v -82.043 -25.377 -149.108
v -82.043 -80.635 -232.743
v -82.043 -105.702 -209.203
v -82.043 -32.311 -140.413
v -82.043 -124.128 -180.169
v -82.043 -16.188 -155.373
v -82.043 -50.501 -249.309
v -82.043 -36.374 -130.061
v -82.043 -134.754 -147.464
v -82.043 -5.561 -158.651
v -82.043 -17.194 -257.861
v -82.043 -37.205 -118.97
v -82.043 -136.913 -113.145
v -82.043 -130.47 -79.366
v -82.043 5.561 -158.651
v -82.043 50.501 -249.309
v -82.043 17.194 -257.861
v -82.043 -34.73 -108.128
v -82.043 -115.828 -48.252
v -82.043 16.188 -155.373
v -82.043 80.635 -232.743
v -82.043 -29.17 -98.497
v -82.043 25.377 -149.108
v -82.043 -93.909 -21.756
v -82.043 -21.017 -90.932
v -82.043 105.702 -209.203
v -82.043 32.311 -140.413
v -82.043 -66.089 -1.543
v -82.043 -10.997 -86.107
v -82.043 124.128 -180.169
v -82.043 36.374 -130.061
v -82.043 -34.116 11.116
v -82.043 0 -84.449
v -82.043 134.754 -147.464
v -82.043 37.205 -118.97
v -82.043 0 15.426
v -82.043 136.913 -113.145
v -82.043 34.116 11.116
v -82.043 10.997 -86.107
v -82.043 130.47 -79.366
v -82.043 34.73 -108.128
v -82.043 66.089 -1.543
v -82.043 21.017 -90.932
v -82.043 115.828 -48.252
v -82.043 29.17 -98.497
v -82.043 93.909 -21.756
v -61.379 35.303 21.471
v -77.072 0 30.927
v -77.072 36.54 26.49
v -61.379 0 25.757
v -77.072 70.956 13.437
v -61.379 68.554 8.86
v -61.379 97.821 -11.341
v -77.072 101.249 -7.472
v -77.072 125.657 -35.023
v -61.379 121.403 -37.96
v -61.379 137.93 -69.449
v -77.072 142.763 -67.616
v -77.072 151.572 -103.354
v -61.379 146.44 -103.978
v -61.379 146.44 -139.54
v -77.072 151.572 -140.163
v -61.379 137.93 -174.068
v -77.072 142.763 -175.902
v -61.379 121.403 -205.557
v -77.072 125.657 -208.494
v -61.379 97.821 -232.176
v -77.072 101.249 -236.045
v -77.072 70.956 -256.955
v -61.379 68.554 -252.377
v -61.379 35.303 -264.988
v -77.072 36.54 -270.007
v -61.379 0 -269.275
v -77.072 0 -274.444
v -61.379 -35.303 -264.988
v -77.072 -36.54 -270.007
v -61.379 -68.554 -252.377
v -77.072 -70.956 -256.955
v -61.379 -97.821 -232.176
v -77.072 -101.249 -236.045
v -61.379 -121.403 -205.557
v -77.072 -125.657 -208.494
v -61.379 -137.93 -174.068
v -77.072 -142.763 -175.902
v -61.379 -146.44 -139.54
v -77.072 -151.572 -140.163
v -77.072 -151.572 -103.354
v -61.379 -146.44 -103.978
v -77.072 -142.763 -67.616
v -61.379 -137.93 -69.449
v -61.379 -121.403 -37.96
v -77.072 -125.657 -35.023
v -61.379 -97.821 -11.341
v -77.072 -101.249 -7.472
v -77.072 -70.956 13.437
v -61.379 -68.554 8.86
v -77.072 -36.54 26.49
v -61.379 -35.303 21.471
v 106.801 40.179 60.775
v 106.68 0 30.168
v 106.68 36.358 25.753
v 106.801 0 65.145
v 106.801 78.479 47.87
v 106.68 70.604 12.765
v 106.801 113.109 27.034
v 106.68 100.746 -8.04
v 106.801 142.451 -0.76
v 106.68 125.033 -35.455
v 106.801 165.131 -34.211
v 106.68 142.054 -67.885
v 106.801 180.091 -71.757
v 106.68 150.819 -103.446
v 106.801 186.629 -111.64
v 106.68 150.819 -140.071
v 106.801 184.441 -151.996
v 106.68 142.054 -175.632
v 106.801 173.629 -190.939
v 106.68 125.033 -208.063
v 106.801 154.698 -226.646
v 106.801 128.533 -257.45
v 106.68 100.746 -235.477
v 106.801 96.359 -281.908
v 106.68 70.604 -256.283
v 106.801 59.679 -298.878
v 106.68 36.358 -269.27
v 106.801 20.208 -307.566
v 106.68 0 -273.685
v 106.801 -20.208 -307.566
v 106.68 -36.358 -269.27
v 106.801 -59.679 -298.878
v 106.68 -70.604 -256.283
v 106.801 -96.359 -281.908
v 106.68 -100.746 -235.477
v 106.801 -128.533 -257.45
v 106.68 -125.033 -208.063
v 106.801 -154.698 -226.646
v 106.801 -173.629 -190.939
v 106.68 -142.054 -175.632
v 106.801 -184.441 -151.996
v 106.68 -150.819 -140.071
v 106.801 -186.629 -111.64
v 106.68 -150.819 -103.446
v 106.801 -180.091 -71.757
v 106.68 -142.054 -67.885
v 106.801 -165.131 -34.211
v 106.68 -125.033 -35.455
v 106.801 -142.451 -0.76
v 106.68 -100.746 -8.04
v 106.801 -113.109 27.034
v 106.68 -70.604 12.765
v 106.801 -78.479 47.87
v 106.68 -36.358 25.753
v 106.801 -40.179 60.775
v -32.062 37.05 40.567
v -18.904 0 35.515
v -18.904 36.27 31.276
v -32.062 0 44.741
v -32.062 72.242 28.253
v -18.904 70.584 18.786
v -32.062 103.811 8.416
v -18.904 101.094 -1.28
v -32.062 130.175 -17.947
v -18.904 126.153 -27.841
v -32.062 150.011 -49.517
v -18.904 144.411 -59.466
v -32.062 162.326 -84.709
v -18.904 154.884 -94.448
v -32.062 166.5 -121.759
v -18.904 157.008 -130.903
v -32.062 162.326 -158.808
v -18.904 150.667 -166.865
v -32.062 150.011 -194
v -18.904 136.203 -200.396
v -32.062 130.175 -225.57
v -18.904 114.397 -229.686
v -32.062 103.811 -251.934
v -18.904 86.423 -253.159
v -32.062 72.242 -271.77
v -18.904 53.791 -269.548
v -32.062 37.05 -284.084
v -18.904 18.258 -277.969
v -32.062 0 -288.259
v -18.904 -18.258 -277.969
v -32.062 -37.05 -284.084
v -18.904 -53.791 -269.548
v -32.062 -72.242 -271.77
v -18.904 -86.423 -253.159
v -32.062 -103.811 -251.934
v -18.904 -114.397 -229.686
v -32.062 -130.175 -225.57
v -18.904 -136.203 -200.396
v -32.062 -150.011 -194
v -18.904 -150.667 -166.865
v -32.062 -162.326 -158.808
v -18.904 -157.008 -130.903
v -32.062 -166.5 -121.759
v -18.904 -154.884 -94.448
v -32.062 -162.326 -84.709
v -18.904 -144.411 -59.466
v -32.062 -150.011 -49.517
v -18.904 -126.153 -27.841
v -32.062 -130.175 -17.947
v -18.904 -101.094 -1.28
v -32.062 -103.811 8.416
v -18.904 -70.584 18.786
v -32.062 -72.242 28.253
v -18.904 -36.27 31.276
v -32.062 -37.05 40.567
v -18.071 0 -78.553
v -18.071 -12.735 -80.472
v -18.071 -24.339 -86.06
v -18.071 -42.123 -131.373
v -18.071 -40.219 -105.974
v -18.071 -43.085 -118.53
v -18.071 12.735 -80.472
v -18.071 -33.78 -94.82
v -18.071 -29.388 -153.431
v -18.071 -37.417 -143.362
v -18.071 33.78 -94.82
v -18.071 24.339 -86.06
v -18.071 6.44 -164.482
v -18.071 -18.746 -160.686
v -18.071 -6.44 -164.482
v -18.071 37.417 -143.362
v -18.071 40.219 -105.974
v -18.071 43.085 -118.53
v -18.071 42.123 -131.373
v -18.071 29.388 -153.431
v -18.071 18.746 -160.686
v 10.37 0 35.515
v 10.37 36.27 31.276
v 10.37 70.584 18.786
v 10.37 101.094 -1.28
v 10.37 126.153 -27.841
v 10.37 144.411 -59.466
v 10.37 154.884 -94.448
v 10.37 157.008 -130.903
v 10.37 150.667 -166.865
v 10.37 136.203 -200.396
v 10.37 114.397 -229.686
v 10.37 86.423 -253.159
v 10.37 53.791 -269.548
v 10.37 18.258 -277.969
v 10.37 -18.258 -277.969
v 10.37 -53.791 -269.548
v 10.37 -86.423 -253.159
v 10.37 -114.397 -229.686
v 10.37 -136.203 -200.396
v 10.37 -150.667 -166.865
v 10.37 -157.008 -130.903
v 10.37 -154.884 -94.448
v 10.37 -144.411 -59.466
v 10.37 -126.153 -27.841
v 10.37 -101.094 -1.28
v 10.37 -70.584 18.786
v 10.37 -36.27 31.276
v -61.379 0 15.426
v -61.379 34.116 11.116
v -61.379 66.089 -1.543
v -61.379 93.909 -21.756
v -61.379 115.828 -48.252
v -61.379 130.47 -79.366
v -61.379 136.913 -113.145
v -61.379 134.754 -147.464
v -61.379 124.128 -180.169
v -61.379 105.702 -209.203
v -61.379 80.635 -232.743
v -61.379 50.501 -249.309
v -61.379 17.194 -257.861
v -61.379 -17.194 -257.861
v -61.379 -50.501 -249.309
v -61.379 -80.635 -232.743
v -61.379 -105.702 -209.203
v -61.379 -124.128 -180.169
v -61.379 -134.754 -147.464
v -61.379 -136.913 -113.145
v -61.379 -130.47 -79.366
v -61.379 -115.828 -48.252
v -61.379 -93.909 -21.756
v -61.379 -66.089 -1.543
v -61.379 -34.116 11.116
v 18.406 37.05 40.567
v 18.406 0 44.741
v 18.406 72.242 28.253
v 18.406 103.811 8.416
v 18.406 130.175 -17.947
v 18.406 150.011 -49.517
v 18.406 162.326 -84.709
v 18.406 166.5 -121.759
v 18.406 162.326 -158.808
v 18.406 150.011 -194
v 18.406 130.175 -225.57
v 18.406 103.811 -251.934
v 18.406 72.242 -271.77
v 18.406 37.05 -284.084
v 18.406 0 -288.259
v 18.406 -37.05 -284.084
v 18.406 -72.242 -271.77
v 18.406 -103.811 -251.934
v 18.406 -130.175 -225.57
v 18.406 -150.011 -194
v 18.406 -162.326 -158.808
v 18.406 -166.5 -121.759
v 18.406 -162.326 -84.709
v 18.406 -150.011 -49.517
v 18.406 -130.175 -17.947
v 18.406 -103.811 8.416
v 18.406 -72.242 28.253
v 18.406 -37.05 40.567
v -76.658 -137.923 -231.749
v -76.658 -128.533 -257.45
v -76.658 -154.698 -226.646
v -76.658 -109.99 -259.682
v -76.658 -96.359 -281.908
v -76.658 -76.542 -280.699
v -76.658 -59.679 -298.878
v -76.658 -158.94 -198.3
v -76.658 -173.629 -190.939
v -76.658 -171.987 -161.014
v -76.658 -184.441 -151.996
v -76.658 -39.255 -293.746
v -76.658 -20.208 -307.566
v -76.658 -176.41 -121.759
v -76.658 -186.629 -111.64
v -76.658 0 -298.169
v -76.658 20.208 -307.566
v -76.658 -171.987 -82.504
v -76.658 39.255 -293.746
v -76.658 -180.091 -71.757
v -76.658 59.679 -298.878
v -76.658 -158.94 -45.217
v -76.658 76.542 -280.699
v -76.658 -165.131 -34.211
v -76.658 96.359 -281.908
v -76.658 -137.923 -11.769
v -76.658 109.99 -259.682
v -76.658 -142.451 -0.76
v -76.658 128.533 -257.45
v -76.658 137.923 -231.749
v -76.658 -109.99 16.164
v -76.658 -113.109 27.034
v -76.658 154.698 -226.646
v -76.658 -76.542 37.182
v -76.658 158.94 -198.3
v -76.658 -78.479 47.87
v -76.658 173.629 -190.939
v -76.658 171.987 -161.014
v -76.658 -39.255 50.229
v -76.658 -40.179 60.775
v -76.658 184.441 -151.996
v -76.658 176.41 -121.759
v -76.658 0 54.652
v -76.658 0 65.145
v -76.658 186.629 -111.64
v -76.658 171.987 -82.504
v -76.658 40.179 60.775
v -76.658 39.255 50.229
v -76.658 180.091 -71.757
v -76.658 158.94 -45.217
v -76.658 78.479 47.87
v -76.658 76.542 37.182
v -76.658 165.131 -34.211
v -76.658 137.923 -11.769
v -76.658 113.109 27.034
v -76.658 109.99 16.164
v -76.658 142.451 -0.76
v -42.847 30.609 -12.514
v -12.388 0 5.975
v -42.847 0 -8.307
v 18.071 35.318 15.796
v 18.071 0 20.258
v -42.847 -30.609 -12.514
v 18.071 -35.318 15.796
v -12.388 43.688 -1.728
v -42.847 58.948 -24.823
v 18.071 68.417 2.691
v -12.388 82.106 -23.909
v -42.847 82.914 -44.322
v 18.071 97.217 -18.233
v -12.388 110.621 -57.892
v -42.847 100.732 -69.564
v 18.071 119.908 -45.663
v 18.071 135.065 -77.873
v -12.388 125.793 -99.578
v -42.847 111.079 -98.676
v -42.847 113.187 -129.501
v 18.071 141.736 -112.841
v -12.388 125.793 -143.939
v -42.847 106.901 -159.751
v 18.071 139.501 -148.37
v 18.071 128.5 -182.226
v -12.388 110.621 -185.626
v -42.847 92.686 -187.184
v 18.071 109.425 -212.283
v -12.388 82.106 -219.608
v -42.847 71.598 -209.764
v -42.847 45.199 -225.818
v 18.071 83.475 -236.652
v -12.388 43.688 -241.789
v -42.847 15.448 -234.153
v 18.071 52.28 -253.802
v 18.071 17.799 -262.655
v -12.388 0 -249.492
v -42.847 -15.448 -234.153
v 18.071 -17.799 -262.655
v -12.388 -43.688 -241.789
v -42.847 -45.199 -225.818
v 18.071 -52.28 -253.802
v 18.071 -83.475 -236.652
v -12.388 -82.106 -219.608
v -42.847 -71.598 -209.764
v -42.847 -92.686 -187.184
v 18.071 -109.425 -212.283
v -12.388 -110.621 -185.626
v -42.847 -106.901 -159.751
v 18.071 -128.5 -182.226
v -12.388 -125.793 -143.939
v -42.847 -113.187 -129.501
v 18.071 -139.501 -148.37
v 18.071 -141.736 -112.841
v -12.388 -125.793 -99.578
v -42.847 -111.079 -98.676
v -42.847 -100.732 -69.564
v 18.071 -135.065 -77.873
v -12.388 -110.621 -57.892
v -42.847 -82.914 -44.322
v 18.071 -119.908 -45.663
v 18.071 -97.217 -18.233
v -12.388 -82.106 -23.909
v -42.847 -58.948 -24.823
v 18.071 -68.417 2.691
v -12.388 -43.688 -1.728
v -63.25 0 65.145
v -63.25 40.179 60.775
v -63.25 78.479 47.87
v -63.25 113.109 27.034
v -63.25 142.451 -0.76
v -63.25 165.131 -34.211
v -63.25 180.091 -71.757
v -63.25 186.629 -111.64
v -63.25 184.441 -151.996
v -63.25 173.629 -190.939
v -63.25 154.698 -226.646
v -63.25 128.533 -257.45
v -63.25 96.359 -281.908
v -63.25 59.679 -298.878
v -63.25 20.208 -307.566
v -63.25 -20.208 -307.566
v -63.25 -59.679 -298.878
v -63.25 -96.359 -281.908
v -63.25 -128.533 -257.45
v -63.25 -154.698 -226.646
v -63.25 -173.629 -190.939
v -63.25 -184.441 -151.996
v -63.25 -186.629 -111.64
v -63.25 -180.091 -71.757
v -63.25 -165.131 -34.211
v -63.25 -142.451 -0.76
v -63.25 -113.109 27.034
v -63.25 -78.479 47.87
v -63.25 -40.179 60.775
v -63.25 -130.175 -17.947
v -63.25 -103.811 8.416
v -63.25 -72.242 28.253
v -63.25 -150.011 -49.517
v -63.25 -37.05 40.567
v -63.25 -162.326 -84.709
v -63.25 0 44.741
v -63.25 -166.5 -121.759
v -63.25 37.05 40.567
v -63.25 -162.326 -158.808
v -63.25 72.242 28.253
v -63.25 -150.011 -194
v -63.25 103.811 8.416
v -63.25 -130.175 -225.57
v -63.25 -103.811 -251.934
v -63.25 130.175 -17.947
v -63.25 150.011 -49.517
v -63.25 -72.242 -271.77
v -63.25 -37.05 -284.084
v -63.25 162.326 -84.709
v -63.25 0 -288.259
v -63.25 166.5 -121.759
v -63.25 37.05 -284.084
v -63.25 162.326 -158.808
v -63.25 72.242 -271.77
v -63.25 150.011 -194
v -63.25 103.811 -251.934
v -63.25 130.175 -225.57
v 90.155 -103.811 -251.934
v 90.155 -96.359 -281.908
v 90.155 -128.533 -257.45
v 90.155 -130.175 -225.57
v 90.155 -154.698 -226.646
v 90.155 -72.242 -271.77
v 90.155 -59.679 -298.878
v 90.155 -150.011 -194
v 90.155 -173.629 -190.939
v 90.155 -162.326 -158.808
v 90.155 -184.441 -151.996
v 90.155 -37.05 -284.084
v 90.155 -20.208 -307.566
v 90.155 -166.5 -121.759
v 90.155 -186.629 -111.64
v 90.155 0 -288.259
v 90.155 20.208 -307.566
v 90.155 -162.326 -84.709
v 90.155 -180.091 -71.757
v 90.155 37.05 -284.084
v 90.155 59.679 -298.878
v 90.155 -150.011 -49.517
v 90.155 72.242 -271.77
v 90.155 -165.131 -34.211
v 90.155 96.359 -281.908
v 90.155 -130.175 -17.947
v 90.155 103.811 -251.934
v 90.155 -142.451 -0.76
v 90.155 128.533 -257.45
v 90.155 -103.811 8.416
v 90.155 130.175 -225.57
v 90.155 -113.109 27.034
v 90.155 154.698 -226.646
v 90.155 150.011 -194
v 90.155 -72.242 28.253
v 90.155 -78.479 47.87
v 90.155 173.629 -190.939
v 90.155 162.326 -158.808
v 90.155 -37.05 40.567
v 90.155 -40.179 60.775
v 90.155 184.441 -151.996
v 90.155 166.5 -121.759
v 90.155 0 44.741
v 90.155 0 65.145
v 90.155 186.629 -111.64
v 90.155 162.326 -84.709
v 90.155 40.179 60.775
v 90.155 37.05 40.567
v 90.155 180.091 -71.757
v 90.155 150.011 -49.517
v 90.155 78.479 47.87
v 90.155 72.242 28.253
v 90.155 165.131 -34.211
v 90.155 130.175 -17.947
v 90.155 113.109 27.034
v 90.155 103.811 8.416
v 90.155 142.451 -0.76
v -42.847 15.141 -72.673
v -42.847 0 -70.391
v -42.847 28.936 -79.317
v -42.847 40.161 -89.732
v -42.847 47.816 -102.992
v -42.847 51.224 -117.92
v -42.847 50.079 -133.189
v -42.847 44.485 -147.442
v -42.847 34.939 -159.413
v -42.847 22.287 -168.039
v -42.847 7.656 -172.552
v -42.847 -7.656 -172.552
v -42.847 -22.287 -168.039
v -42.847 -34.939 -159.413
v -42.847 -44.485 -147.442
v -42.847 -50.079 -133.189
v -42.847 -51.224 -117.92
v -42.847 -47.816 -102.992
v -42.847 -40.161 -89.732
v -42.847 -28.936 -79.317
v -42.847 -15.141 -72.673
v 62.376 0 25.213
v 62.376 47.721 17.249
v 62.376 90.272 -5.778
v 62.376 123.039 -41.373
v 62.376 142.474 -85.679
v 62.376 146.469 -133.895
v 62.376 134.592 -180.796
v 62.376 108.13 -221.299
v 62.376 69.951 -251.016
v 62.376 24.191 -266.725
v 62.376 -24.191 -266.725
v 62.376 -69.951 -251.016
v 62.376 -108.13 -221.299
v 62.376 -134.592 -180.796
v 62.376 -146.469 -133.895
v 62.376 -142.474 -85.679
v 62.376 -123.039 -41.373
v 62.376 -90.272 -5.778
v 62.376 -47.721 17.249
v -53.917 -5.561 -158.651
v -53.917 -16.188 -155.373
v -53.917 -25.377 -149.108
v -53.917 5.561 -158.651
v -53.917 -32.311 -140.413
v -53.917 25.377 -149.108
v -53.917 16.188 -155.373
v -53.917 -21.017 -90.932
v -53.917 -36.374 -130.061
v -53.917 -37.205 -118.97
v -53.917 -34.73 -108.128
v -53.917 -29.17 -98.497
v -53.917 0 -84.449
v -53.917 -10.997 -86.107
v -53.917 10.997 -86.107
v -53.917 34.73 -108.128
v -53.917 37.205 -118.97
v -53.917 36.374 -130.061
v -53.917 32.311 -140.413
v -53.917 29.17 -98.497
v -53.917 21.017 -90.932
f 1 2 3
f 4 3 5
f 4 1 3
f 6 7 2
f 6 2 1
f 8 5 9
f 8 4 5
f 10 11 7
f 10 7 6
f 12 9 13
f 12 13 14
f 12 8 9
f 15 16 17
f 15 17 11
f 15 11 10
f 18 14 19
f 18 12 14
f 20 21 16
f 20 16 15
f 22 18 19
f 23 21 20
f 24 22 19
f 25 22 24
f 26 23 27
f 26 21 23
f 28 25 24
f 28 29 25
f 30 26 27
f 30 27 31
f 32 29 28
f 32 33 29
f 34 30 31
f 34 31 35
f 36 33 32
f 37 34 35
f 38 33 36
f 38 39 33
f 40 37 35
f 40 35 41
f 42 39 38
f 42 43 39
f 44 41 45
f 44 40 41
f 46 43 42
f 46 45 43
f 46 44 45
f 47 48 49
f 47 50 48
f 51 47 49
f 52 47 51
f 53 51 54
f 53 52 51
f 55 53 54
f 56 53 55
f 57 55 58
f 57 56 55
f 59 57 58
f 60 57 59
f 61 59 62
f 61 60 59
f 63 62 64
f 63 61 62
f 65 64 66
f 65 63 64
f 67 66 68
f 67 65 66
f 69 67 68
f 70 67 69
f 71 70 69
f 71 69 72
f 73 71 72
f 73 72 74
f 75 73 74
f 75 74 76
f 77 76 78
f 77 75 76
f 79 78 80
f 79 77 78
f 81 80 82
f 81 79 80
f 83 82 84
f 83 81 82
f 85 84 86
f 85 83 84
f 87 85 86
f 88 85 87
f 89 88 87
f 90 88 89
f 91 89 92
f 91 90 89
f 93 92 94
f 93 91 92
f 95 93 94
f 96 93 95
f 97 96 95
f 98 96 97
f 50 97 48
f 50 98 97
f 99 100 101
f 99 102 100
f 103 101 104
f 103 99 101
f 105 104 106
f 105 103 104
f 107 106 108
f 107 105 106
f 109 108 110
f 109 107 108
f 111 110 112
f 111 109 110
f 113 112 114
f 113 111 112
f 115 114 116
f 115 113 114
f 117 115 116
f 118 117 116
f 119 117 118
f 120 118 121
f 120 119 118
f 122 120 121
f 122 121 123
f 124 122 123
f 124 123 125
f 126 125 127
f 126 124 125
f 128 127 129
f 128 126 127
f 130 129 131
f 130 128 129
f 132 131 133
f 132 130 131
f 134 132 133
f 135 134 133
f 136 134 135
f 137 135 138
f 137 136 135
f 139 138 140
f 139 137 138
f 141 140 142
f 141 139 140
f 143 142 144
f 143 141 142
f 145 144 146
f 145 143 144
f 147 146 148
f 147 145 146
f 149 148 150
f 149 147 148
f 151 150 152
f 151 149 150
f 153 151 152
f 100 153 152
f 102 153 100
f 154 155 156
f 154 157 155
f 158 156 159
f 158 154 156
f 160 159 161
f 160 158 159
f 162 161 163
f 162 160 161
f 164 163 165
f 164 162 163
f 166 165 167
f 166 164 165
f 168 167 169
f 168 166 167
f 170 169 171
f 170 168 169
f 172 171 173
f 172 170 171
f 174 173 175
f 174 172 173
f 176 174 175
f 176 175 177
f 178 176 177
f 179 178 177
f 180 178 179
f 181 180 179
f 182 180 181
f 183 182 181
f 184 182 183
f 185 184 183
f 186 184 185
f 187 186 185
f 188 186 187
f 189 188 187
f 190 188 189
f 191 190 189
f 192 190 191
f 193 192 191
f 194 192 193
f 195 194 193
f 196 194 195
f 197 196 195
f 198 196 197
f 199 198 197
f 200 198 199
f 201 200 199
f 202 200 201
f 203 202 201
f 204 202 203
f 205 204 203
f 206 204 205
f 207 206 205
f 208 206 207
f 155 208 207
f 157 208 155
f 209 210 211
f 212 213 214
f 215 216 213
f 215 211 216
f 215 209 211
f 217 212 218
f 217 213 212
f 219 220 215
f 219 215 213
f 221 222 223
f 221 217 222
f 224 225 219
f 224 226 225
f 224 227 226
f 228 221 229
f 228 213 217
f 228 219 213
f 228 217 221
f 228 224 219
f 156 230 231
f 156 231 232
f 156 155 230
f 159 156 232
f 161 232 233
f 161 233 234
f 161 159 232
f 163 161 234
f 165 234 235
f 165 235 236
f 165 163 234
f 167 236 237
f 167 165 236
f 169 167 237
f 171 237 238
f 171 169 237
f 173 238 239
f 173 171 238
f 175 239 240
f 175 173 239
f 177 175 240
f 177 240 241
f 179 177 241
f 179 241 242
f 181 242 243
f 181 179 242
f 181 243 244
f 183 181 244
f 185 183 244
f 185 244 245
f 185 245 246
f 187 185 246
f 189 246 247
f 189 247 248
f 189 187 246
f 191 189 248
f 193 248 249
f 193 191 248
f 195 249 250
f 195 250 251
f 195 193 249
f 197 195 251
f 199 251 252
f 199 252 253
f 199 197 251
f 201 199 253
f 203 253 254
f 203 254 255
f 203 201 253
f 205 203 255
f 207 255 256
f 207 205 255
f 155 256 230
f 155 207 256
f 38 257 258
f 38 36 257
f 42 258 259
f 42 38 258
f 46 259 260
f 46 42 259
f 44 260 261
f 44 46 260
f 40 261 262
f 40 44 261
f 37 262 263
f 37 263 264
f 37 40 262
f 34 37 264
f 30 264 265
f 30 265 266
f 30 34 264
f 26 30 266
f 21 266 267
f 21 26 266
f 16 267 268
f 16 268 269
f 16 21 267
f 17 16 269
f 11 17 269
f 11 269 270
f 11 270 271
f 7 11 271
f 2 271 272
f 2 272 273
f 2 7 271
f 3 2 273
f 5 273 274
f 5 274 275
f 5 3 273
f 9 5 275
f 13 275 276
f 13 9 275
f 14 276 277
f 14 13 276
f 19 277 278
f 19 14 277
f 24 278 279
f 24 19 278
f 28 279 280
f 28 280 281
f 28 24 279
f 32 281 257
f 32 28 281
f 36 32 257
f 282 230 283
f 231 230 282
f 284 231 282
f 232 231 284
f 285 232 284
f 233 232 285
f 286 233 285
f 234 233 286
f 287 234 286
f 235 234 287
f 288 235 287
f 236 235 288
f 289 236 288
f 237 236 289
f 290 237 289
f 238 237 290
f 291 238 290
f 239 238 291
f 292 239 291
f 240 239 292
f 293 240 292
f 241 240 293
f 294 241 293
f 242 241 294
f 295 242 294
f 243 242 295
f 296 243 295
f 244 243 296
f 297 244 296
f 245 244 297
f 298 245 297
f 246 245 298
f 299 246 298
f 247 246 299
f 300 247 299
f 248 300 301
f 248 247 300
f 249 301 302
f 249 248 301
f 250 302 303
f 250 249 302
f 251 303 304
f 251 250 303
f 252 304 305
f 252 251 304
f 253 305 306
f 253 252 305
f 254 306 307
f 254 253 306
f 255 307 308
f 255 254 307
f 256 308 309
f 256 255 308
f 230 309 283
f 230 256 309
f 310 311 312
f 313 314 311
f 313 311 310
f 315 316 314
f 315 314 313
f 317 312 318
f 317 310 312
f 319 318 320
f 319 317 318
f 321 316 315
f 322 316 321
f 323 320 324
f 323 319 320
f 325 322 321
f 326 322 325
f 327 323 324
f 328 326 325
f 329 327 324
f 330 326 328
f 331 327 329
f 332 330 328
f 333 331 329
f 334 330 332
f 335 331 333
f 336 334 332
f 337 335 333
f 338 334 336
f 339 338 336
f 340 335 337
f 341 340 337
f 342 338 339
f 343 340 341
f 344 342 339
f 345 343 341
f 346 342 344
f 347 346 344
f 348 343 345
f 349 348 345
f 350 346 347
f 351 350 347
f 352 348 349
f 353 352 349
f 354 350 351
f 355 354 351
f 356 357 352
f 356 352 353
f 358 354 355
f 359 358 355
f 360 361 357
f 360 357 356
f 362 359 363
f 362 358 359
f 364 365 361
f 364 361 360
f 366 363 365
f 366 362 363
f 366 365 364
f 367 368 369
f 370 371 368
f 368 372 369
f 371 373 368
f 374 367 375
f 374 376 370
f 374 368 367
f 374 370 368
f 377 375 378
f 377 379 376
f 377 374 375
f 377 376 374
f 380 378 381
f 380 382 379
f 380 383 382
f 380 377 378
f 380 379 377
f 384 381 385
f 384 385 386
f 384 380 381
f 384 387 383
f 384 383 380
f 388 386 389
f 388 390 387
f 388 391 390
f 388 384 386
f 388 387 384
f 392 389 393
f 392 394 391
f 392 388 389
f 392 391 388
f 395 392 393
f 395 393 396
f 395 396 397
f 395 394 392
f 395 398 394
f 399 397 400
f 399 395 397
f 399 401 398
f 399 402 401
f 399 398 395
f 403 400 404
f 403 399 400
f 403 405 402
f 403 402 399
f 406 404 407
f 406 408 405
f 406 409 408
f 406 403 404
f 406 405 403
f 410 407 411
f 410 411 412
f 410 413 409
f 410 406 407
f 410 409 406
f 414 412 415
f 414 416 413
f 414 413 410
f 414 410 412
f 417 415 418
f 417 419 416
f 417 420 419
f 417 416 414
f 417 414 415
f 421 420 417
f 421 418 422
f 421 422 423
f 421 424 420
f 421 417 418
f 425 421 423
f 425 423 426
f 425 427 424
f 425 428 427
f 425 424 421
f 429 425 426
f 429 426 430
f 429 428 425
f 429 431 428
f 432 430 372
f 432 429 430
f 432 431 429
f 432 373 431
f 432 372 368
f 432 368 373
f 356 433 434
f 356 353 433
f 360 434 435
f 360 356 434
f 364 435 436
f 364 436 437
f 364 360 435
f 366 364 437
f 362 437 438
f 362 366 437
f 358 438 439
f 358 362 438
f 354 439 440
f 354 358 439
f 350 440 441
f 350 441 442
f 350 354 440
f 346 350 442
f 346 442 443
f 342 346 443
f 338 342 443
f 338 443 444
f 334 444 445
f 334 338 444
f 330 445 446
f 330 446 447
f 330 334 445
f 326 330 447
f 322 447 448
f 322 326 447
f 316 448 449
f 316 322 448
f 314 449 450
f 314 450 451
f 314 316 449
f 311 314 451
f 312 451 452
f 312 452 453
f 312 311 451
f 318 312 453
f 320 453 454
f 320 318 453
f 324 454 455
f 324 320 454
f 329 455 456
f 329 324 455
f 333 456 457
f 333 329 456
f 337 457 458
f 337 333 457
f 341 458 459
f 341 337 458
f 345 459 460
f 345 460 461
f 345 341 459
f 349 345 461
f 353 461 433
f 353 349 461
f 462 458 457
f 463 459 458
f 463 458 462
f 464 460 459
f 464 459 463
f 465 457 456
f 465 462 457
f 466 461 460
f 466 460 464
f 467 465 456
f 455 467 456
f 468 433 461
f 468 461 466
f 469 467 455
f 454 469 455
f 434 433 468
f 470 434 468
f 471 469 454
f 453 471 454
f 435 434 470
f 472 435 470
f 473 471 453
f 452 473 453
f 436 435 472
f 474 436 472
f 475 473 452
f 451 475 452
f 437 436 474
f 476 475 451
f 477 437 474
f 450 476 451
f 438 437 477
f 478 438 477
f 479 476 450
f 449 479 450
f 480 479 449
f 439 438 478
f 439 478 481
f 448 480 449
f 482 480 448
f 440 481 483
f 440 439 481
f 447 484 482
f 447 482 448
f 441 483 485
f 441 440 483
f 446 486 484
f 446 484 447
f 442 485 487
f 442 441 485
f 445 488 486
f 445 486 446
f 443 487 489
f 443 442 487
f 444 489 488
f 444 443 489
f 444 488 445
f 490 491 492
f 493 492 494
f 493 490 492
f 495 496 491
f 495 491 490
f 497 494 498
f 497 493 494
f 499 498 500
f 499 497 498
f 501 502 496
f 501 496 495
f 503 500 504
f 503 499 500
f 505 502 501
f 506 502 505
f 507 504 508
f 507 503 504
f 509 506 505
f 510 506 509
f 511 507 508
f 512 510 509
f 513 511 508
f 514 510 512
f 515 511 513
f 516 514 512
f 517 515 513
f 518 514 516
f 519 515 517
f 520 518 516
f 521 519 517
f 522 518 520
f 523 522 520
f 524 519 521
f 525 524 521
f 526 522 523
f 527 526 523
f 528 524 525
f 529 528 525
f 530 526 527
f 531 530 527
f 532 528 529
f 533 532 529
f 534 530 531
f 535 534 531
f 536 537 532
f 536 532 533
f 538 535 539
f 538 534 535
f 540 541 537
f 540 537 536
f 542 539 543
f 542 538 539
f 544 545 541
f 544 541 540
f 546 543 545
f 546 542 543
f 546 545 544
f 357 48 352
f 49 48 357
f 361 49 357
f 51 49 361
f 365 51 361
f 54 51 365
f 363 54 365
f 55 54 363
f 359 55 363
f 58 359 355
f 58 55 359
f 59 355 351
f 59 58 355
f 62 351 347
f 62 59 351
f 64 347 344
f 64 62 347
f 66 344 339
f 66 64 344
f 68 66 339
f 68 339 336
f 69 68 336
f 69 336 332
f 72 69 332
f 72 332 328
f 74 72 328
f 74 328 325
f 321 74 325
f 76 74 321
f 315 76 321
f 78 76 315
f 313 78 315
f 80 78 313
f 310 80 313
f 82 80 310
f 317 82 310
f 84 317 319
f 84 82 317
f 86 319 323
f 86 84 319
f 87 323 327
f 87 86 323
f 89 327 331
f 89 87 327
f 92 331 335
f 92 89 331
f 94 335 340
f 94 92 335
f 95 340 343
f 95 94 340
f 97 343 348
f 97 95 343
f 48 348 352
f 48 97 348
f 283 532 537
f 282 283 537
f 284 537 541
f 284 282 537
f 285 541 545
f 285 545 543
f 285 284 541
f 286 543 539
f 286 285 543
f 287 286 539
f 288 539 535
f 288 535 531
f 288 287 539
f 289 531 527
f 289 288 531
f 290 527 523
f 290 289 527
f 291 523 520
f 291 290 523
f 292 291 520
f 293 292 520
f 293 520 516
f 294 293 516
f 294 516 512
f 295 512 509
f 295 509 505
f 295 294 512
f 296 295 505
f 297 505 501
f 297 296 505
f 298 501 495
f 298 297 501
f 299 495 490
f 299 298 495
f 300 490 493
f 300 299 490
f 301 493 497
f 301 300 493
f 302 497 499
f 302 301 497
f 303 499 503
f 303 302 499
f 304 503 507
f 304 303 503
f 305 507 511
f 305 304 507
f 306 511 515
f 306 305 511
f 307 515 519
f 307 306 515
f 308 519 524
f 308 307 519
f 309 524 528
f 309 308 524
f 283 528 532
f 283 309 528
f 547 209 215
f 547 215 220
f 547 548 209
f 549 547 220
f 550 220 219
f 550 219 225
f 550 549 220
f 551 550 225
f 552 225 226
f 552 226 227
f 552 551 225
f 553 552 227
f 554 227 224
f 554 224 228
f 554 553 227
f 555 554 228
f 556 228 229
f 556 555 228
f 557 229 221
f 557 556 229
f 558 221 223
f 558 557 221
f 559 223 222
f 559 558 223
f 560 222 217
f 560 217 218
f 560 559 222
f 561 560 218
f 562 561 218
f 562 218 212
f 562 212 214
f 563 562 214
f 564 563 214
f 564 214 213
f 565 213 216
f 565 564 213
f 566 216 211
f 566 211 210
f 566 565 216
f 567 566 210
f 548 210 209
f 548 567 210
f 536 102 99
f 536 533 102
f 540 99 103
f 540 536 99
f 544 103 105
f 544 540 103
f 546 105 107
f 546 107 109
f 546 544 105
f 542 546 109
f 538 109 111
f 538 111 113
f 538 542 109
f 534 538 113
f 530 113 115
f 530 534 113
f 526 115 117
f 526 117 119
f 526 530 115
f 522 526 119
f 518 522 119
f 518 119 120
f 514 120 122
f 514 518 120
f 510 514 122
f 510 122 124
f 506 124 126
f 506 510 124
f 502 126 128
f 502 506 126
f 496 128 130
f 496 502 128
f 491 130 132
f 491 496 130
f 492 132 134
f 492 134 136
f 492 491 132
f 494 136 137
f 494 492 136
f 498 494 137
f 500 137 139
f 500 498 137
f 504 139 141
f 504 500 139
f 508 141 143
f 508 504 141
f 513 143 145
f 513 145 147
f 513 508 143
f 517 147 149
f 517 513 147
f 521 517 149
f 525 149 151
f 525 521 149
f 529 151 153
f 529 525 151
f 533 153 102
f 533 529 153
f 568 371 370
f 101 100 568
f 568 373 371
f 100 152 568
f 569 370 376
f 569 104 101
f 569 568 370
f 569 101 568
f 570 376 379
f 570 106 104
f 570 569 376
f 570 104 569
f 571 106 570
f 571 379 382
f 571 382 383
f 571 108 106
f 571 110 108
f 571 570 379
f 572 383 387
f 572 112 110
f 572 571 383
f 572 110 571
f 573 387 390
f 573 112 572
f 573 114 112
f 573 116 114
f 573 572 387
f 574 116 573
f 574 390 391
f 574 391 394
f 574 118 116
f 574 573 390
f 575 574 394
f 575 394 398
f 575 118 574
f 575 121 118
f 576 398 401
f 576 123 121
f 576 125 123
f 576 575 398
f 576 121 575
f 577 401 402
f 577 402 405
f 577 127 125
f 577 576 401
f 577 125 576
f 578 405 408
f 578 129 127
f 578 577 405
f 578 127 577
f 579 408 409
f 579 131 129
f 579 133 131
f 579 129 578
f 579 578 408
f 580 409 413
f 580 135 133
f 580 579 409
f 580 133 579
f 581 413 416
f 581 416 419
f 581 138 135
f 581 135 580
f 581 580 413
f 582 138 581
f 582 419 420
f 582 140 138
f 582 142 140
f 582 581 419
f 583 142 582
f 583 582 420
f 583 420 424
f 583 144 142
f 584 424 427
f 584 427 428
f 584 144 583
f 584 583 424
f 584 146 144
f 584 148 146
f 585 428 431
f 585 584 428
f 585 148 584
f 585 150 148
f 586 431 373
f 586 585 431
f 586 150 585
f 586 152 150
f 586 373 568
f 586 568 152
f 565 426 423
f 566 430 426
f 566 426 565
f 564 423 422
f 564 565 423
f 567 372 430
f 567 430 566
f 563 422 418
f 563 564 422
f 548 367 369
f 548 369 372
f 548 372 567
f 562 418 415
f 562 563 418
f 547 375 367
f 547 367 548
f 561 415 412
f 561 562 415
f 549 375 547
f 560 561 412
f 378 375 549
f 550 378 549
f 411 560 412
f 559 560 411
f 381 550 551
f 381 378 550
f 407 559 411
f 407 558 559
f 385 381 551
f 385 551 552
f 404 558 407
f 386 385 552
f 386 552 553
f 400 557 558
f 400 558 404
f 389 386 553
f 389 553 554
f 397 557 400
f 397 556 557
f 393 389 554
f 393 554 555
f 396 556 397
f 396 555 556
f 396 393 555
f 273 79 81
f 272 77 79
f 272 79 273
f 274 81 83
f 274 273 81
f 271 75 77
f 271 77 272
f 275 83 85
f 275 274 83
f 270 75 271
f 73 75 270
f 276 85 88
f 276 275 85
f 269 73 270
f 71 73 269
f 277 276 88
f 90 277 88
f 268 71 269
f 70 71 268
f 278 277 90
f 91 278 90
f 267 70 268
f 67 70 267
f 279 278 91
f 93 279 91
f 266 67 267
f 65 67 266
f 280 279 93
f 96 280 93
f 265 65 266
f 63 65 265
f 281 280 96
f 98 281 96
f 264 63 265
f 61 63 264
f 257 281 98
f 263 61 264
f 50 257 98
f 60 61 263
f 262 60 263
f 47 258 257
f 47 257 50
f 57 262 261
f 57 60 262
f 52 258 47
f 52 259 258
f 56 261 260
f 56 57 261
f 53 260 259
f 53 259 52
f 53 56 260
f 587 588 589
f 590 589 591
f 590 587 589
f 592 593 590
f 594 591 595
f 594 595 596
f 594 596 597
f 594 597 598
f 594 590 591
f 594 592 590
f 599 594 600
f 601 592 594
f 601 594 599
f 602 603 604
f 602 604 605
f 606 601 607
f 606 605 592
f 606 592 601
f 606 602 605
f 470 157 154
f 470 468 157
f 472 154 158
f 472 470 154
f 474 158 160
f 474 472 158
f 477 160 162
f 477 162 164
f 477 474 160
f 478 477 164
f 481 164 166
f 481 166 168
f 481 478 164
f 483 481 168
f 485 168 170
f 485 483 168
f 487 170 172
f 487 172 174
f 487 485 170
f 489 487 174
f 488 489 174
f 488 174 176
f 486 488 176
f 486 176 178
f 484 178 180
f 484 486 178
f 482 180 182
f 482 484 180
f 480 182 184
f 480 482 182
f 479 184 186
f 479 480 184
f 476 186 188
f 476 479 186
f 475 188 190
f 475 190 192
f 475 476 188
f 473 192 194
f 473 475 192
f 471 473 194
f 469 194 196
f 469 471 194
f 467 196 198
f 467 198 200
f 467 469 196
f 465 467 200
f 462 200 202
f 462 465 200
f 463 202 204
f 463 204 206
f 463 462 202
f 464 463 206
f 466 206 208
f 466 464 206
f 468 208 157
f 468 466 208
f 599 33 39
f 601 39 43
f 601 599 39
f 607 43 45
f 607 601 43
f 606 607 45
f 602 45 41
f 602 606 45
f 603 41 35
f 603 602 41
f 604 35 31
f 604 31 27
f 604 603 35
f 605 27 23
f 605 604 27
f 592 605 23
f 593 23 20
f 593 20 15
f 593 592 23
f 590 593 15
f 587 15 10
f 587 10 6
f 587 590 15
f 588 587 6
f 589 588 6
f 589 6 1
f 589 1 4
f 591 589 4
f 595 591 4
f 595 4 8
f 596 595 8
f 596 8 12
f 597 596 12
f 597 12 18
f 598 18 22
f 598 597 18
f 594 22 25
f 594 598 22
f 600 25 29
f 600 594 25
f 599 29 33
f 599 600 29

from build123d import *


with BuildPart() as f1:
    # F0 (on Front) → F1 (revolve)
    with BuildSketch(Plane.XZ):
        Polygon((-63.250169, 65.144755), (-76.658033, 65.144755), (-76.658033, 54.65164), (-77.071565, 30.926656), (-61.379056, 25.757357), (-61.379056, 15.4255), (-82.042769, 15.4255), (-82.042769, -84.449112), (-53.917158, -84.449112), (-53.917158, -121.758595), (-18.071475, -121.758595), (-18.071475, -78.552626), (-42.846885, -70.391312), (-42.846885, -8.307049), (18.071476, 20.257542), (106.680006, 30.167704), (106.800616, 65.144755), (90.154849, 65.144755), (90.154849, 44.741478), (18.405836, 44.741478), (10.369949, 35.515223), (-18.903643, 35.515223), (-32.062296, 44.741478), (-63.250169, 44.741478), align=None)
    revolve(axis=Axis((-35.994316, 0, -121.758595), (-1, 0, 0)))


solid = f1.part
